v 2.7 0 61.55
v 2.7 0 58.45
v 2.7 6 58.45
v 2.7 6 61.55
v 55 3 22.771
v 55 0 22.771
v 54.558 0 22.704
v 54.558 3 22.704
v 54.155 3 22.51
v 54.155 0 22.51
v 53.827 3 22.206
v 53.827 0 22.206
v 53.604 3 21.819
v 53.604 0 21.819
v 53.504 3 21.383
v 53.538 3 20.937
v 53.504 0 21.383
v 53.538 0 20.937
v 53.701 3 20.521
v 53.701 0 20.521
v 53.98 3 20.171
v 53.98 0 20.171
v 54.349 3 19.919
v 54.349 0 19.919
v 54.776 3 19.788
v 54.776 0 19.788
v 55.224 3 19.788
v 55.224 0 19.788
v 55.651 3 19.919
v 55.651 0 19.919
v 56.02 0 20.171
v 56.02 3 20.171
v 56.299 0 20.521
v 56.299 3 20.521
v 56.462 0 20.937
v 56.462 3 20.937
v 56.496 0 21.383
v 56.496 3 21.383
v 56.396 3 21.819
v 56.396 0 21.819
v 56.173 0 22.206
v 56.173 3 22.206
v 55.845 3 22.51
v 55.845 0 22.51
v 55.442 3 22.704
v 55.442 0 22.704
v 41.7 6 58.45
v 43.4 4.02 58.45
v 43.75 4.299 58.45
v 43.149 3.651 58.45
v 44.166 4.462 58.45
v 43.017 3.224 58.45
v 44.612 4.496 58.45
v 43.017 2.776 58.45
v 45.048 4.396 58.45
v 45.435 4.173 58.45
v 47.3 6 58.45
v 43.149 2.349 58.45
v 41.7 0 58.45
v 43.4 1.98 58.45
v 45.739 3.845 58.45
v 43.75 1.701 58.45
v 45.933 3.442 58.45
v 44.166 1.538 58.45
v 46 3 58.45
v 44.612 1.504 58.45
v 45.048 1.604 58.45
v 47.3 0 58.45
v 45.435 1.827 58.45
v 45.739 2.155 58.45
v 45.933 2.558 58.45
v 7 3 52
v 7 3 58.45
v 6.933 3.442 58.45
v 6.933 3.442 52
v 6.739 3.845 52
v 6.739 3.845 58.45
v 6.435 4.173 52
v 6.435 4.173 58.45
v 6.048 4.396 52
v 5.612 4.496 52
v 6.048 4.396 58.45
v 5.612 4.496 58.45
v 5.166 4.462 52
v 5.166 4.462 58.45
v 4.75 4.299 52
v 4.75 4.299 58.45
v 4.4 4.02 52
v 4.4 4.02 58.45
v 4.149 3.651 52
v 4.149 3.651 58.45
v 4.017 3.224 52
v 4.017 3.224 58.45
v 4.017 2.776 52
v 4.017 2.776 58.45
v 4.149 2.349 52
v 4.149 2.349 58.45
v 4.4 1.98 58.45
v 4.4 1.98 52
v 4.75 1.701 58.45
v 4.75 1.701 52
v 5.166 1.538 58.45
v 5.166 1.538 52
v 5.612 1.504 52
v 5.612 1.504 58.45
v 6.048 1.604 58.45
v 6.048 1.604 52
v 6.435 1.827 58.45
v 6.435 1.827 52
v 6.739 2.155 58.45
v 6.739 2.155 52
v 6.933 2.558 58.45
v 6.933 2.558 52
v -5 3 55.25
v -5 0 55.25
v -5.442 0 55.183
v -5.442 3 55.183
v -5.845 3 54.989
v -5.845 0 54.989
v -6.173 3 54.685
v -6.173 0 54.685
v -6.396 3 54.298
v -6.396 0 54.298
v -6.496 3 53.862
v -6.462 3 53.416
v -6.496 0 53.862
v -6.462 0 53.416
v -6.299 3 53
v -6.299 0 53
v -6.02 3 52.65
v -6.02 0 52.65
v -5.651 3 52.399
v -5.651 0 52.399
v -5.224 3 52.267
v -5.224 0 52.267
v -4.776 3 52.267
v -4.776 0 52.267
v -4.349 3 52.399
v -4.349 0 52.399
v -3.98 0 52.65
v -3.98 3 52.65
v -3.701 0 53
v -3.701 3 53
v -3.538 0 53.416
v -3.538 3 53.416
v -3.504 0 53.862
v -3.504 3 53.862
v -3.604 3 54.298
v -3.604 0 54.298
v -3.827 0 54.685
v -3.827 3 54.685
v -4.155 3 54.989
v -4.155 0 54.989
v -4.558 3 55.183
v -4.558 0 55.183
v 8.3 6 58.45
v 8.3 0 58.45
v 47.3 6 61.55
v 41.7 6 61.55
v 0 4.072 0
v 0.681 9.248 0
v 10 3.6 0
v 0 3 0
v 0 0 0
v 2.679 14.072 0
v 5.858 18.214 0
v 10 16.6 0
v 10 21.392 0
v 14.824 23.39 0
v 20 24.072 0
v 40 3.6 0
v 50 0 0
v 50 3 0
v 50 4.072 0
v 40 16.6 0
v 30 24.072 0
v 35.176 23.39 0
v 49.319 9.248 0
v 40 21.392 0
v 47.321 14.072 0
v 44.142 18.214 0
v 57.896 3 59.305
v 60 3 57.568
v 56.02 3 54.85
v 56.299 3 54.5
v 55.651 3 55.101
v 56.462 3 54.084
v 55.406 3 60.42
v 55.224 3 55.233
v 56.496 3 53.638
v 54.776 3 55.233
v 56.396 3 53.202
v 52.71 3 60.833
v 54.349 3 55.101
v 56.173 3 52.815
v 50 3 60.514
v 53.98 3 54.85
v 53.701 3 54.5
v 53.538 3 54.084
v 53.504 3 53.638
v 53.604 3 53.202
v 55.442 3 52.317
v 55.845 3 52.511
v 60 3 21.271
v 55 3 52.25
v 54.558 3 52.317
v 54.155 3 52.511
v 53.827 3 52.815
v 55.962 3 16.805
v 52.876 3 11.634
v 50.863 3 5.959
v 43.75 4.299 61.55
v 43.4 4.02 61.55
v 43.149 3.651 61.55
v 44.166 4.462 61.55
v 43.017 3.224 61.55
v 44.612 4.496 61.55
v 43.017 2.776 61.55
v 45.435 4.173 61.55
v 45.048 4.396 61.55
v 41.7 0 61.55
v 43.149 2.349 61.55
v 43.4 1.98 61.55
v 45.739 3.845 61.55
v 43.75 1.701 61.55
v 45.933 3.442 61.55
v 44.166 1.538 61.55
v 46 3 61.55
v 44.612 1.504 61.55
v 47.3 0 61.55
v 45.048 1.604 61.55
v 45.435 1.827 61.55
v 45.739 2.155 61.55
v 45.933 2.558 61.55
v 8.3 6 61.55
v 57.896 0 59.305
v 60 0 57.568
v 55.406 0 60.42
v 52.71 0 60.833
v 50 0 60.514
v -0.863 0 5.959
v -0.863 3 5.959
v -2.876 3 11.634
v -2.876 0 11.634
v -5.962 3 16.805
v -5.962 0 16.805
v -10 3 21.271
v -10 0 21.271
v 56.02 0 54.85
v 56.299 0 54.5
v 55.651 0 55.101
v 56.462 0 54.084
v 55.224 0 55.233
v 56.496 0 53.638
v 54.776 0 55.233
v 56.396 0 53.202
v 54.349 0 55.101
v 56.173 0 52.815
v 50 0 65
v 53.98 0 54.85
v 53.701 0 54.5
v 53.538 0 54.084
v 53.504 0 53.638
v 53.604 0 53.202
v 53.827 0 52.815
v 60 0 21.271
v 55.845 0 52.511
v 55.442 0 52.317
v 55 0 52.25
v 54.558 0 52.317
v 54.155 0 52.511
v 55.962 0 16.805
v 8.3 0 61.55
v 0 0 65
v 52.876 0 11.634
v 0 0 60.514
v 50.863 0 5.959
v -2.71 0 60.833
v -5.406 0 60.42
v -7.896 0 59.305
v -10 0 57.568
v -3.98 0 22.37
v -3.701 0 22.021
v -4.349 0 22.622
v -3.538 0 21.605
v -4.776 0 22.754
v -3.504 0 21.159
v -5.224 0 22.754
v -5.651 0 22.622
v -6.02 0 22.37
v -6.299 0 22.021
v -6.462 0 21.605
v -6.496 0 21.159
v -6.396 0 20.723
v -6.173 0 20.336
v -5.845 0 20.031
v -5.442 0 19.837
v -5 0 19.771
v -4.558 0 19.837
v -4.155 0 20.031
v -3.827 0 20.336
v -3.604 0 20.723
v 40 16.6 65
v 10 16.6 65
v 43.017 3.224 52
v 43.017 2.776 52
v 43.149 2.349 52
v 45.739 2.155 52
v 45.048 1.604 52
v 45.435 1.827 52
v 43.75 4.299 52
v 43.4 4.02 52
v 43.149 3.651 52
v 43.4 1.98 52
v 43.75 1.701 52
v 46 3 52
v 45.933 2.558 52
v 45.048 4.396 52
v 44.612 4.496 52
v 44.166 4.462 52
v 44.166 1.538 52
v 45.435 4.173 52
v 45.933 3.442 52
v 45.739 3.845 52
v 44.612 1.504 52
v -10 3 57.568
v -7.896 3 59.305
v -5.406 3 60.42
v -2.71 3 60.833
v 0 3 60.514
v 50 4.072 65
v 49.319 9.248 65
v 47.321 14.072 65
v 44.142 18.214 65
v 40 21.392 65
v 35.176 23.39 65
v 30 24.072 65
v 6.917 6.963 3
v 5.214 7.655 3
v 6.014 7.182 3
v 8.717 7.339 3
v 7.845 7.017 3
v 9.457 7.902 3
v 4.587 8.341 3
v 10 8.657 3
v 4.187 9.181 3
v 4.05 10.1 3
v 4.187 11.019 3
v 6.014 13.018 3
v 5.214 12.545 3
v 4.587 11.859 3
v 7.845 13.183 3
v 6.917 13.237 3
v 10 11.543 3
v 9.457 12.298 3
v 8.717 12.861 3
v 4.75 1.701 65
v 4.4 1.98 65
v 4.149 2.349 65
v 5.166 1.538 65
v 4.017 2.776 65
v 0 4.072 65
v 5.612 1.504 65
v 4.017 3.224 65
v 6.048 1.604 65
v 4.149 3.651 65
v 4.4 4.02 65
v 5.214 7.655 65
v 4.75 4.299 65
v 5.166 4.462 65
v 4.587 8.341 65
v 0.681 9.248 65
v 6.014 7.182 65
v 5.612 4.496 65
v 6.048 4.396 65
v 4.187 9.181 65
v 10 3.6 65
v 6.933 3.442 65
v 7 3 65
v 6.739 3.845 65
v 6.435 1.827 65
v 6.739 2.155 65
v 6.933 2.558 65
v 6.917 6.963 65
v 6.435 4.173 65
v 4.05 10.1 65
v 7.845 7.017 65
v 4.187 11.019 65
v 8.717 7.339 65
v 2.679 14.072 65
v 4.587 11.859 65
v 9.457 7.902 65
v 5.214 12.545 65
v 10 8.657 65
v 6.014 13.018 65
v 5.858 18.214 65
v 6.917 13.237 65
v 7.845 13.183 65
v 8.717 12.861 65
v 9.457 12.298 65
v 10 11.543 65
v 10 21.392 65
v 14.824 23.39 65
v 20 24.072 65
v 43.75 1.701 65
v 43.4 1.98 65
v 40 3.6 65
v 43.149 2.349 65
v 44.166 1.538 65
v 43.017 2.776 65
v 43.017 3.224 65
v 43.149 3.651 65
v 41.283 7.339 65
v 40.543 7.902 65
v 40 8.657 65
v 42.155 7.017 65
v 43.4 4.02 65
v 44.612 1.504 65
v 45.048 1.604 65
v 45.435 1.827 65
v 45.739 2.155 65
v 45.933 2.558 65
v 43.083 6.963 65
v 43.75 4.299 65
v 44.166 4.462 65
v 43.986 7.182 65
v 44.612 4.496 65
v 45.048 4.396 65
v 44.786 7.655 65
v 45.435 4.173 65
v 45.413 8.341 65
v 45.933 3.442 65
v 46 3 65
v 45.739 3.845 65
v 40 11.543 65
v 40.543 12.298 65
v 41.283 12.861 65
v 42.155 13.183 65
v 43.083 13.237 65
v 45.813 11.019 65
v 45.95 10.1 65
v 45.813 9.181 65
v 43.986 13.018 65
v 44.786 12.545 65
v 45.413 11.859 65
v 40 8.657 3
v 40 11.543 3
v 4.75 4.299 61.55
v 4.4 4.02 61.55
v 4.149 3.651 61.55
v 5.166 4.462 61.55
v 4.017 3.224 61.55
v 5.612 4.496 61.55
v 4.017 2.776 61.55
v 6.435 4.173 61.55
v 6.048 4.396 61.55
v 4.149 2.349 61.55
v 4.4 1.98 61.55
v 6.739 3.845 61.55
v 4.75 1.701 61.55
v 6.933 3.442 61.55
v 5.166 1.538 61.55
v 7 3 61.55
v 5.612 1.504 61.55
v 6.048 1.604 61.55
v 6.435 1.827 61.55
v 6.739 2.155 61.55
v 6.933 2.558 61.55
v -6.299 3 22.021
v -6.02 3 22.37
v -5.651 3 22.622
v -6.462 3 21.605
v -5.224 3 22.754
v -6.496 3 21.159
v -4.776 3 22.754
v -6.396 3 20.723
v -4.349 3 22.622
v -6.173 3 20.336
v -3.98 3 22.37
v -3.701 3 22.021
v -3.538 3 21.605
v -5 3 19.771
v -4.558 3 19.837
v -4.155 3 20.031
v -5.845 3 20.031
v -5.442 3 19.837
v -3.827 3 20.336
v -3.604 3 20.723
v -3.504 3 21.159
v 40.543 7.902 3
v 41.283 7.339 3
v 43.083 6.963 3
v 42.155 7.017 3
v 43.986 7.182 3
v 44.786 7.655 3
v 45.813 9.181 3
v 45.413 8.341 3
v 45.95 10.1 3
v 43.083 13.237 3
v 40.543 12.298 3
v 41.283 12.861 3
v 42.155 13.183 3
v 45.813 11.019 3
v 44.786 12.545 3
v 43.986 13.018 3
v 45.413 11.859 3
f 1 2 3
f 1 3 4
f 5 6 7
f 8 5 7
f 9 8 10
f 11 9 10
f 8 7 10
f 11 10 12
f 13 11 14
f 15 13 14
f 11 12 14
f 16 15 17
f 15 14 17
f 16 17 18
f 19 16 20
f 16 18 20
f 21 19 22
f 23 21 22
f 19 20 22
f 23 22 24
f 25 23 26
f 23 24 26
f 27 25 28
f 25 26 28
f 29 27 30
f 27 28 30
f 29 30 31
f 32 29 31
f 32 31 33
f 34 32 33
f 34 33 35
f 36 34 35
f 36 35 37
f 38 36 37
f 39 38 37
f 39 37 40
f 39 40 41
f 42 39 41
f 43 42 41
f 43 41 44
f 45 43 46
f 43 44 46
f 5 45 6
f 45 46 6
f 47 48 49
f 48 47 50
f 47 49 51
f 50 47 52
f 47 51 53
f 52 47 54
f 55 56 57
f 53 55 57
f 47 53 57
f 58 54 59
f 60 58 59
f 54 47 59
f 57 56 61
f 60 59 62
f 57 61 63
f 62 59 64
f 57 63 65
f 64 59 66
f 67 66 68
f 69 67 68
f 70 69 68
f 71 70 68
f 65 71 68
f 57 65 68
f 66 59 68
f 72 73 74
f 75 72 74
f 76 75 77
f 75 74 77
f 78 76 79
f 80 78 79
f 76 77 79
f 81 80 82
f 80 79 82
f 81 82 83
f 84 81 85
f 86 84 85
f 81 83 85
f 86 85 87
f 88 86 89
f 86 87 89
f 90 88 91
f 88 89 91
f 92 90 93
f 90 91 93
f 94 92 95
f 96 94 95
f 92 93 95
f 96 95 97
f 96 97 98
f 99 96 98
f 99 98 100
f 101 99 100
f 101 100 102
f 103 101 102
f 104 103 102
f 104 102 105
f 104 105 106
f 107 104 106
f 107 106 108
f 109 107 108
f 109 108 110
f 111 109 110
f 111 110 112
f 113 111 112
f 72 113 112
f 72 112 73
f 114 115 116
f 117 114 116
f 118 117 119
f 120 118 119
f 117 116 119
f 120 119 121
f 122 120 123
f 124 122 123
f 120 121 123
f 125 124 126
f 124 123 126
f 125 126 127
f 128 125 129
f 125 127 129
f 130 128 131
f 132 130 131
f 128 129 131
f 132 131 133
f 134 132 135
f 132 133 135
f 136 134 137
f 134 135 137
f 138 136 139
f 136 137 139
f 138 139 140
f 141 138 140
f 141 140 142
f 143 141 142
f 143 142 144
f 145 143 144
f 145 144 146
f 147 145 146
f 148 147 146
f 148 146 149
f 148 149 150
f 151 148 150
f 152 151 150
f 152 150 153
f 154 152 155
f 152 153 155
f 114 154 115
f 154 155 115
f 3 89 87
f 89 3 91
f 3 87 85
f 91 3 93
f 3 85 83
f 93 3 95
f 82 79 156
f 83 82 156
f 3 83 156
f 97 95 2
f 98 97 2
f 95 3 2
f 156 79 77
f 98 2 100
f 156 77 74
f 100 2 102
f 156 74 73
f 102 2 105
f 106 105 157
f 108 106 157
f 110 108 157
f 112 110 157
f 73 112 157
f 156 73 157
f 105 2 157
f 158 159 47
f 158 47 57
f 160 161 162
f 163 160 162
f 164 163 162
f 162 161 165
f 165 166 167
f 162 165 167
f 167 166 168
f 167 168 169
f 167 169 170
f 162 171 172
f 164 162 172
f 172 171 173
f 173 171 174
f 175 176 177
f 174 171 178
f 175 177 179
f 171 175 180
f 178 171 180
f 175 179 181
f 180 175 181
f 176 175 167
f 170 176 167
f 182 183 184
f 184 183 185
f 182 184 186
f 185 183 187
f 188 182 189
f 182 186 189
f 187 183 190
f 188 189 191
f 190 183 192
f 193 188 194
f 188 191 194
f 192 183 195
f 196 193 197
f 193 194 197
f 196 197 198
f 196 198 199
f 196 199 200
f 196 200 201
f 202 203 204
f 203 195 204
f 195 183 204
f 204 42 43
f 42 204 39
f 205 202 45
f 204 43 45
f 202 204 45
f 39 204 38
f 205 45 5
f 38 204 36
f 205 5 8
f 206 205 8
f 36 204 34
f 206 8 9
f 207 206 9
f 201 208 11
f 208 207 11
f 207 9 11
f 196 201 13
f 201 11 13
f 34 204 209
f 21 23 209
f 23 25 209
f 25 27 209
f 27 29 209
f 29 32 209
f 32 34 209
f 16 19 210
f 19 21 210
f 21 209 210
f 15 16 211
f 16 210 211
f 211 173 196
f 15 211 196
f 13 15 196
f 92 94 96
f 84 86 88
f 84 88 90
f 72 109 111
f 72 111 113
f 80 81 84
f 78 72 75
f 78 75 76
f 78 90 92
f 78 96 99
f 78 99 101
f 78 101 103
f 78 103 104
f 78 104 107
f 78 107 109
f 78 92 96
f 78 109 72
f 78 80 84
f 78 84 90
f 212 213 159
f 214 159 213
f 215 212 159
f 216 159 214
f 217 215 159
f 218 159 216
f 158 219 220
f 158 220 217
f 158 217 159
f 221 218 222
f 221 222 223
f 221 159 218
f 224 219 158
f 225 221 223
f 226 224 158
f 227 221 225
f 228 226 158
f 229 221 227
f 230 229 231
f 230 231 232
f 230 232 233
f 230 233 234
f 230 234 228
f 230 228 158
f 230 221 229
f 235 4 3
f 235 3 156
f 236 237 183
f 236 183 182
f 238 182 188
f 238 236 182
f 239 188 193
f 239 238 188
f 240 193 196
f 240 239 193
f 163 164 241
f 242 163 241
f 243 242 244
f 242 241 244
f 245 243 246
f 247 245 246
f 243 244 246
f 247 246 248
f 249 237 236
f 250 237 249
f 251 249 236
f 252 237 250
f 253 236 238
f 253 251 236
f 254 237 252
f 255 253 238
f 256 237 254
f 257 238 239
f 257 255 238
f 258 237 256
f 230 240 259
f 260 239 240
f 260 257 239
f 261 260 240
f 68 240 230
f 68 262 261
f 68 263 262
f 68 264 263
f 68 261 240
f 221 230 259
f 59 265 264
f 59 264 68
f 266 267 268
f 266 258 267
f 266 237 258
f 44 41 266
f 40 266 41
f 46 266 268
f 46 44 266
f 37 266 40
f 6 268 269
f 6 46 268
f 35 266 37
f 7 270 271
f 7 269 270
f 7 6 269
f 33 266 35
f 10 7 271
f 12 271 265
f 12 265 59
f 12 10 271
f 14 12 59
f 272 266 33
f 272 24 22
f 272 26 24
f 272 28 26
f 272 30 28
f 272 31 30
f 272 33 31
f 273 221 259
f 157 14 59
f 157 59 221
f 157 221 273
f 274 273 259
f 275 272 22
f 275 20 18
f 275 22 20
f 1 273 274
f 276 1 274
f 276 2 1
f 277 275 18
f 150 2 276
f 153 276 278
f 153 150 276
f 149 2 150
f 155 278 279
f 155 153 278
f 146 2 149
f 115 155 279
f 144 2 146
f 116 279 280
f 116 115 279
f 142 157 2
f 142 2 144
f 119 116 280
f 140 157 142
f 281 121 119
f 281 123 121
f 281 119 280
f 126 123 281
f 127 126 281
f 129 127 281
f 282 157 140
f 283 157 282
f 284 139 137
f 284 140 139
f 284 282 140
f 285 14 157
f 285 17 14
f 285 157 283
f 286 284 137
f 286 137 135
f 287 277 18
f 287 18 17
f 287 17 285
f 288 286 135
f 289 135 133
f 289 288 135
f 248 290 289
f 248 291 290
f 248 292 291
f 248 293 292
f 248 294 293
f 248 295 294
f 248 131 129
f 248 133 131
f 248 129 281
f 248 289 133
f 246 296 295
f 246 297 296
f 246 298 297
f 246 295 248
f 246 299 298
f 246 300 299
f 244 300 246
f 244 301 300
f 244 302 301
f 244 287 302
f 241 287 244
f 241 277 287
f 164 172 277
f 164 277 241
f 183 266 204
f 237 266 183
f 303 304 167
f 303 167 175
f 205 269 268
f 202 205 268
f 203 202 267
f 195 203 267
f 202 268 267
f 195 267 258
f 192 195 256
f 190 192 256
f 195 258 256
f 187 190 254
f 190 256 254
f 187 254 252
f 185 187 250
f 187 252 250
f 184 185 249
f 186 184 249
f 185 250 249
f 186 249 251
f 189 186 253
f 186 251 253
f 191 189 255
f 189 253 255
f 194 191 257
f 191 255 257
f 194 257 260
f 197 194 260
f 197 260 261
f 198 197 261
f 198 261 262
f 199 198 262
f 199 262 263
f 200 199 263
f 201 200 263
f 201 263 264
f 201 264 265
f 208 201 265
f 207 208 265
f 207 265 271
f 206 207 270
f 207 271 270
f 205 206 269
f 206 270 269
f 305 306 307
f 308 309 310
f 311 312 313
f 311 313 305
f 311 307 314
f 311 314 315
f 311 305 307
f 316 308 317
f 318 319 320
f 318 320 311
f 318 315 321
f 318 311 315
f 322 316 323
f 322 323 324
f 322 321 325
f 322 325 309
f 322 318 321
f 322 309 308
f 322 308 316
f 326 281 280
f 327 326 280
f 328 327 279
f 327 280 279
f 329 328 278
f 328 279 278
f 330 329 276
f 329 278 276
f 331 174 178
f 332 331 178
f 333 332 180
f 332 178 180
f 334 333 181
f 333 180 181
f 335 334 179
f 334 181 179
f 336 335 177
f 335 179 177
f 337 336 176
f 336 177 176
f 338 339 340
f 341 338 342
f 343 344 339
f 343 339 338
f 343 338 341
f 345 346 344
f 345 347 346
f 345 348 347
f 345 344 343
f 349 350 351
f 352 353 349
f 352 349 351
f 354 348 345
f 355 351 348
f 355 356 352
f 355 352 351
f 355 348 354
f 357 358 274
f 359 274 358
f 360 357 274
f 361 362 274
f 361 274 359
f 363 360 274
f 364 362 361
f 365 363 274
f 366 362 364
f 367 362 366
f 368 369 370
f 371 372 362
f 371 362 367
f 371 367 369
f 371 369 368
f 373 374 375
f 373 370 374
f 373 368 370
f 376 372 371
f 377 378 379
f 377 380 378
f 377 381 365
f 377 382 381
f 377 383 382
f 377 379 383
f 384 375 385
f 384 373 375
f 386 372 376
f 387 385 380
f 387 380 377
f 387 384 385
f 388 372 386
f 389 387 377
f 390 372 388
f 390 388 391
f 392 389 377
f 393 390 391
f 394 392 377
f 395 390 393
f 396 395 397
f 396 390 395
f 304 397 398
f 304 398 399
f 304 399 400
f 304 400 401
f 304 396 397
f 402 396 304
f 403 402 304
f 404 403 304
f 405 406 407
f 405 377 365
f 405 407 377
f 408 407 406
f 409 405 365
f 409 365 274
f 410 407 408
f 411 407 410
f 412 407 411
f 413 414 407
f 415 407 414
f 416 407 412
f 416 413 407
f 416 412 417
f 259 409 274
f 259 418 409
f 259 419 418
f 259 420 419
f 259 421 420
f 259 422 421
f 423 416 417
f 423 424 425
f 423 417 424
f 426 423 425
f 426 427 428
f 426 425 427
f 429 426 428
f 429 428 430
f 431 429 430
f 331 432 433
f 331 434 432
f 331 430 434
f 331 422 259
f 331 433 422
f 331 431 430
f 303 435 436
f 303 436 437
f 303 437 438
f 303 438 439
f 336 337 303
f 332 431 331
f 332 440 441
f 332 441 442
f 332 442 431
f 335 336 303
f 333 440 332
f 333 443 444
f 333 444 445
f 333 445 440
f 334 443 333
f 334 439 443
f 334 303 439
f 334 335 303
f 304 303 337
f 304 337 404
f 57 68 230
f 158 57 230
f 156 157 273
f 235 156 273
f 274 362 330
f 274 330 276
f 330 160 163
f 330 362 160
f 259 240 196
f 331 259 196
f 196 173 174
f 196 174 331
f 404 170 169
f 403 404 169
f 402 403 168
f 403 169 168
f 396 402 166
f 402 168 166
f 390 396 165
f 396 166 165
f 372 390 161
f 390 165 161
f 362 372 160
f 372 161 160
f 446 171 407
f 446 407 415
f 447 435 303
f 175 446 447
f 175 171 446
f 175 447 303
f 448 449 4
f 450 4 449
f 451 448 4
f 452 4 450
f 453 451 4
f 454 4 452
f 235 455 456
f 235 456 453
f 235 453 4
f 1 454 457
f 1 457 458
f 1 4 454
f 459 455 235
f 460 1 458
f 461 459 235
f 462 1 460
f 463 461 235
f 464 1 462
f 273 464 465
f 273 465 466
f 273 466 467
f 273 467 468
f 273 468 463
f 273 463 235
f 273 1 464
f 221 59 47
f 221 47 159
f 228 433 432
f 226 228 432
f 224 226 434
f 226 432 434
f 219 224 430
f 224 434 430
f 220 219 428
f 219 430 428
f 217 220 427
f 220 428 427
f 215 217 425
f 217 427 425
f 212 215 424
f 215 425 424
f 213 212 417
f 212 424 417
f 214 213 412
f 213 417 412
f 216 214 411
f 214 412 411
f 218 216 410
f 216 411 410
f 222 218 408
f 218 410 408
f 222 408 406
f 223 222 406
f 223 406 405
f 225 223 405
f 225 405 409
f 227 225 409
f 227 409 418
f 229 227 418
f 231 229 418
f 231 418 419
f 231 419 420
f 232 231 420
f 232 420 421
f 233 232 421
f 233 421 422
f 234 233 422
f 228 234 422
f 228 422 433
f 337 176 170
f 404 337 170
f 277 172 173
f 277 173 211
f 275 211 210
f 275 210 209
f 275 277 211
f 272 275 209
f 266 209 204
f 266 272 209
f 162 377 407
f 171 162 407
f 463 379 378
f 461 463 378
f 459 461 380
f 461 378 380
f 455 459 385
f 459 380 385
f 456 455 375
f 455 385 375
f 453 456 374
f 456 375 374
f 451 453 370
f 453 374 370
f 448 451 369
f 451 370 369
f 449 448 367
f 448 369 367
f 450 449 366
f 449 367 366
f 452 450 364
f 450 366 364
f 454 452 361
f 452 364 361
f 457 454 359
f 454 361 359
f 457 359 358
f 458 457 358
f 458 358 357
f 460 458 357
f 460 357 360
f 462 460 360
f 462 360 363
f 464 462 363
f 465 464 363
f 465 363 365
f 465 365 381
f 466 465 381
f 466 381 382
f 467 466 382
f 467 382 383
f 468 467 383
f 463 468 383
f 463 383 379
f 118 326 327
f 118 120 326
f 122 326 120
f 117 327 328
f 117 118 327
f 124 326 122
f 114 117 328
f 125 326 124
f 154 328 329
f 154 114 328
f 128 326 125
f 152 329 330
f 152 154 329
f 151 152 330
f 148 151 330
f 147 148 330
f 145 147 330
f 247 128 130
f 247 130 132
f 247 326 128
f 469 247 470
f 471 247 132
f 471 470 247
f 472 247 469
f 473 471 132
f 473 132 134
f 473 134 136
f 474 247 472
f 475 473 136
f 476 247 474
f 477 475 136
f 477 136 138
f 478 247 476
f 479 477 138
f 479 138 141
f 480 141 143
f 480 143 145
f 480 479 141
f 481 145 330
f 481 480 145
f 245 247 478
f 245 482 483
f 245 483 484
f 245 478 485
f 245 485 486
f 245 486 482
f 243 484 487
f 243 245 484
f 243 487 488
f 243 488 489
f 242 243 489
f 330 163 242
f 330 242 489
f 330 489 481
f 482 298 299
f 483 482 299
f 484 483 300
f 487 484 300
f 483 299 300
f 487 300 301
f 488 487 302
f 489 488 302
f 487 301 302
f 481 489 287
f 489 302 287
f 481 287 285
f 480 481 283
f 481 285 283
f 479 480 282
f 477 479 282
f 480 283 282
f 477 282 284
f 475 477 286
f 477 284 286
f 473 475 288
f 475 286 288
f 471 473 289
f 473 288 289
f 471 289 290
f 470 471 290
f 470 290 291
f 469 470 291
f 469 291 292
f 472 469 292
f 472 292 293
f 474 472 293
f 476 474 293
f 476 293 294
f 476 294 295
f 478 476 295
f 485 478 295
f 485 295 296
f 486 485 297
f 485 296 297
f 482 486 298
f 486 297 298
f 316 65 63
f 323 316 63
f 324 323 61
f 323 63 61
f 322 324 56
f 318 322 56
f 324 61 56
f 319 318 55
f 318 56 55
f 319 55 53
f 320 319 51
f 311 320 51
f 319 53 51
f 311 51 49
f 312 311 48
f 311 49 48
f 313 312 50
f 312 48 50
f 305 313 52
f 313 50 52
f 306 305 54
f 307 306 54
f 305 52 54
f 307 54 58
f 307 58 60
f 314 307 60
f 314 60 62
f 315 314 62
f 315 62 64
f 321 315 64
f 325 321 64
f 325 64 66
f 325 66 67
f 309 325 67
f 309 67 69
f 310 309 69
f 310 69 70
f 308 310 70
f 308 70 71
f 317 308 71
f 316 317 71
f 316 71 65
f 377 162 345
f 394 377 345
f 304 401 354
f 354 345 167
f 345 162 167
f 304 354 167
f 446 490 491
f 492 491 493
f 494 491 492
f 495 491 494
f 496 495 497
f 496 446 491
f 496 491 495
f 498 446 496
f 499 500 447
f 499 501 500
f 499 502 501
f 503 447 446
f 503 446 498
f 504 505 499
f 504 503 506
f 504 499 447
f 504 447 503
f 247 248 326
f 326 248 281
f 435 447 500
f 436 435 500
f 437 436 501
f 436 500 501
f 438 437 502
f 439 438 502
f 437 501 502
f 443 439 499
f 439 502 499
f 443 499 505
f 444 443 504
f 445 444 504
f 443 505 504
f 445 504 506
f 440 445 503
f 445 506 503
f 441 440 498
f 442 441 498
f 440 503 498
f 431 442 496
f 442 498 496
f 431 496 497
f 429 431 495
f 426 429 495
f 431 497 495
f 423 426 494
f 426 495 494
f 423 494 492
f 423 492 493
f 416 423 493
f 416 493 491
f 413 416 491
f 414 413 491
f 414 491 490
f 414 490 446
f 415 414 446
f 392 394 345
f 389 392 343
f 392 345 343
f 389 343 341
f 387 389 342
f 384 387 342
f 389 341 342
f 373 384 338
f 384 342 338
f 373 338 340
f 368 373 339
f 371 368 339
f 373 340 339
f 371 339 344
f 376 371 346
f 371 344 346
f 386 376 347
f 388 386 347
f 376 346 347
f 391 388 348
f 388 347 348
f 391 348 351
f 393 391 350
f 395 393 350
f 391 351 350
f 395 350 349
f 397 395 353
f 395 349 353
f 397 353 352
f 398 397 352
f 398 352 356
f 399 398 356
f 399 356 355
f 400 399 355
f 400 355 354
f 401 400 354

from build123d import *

# Parameters (mm, degrees)
SKETCH1_W           = 30
SKETCH1_H           = 13
BOSS_EXTRUDE2_DEPTH = 3
BOSS_EXTRUDE3_DEPTH = 65
SKETCH5_R           = 1.5
CUT_EXTRUDE3_DEPTH  = 13
SKETCH6_R           = 1.5
BOSS_EXTRUDE4_DEPTH = 3
SKETCH7_W           = 5.6
SKETCH7_H           = 3.1
CUT_EXTRUDE4_DEPTH  = 6


with BuildPart() as part:
    # Sketch1 → Boss-Extrude2 (new body)
    with BuildSketch(Plane.XY):
        with BuildLine():
            Line((0, 4.071593084), (0, 0))
            Line((0, 0), (50, 0))
            Line((50, 0), (50, 4.071593084))
            ThreePointArc((50, 4.071593084), (44.142135624, 18.213728707), (30, 24.071593084))
            Line((30, 24.071593084), (20, 24.071593084))
            ThreePointArc((20, 24.071593084), (5.857864376, 18.213728707), (0, 4.071593084))
        make_face()
        with Locations((25, 10.1)):
            Rectangle(SKETCH1_W, SKETCH1_H, mode=Mode.SUBTRACT)
    extrude(amount=BOSS_EXTRUDE2_DEPTH)

    # Sketch1<4> → Boss-Extrude3 (add)
    with BuildSketch(Plane.XY):
        with BuildLine():
            Line((0, 4.071593084), (0, 0))
            Line((0, 0), (50, 0))
            Line((50, 0), (50, 4.071593084))
            ThreePointArc((50, 4.071593084), (44.142135624, 18.213728707), (30, 24.071593084))
            Line((30, 24.071593084), (20, 24.071593084))
            ThreePointArc((20, 24.071593084), (5.857864376, 18.213728707), (0, 4.071593084))
        make_face()
        with BuildLine():
            Line((10, 11.543086969), (10, 16.6))
            Line((10, 16.6), (40, 16.6))
            Line((40, 16.6), (40, 11.543086969))
            ThreePointArc((40, 11.543086969), (45.95, 10.1), (40, 8.656913031))
            Line((40, 8.656913031), (40, 3.6))
            Line((40, 3.6), (25, 3.6))
            Line((25, 3.6), (10, 3.6))
            Line((10, 3.6), (10, 8.656913031))
            ThreePointArc((10, 8.656913031), (4.05, 10.1), (10, 11.543086969))
        make_face(mode=Mode.SUBTRACT)
    extrude(amount=BOSS_EXTRUDE3_DEPTH)

    # Sketch5 → Cut-Extrude3 (cut)
    with BuildSketch(Plane.XY.offset(65)):
        with Locations((5.5, 3)):
            Circle(SKETCH5_R)
        with Locations((44.5, 3)):
            Circle(SKETCH5_R)
    extrude(amount=-CUT_EXTRUDE3_DEPTH, mode=Mode.SUBTRACT)

    # Sketch6 → Boss-Extrude4 (add)
    # profile 1 of 2: a face of its own
    with BuildSketch(Plane(origin=(0, 0, 0), x_dir=(-1, 0, 0), z_dir=(0, -1, 0))):
        with BuildLine():
            Line((-60, -21.270803163), (-60, -57.567716257))
            ThreePointArc((-60, -57.567716257), (-55.406345217, -60.42004806), (-50, -60.514347456))
            Line((-50, -60.514347456), (-50, 0))
            ThreePointArc((-50, 0), (-52.87596668, -11.633969103), (-60, -21.270803163))
        make_face()
        with Locations((-55, -53.75)):
            Circle(SKETCH6_R, mode=Mode.SUBTRACT)
        with Locations((-55, -21.270803163)):
            Circle(SKETCH6_R, mode=Mode.SUBTRACT)
    # profile 2 of 2: a face of its own
    with BuildSketch(Plane(origin=(0, 0, 0), x_dir=(-1, 0, 0), z_dir=(0, -1, 0))):
        with BuildLine():
            Line((0, -60.514347456), (0, 0))
            ThreePointArc((0, 0), (2.87596668, -11.633969103), (10, -21.270803163))
            Line((10, -21.270803163), (10, -57.567716257))
            ThreePointArc((10, -57.567716257), (5.406345217, -60.42004806), (0, -60.514347456))
        make_face()
        with Locations((5, -21.270803163)):
            Circle(SKETCH6_R, mode=Mode.SUBTRACT)
        with Locations((5, -53.75)):
            Circle(SKETCH6_R, mode=Mode.SUBTRACT)
    extrude(amount=-BOSS_EXTRUDE4_DEPTH)

    # Sketch7 → Cut-Extrude4 (cut)
    with BuildSketch(Plane.XZ):
        with Locations((44.5, 60)):
            Rectangle(SKETCH7_W, SKETCH7_H)
        with Locations((5.5, 60)):
            Rectangle(SKETCH7_W, SKETCH7_H)
    extrude(amount=-CUT_EXTRUDE4_DEPTH, mode=Mode.SUBTRACT)


solid = part.part
